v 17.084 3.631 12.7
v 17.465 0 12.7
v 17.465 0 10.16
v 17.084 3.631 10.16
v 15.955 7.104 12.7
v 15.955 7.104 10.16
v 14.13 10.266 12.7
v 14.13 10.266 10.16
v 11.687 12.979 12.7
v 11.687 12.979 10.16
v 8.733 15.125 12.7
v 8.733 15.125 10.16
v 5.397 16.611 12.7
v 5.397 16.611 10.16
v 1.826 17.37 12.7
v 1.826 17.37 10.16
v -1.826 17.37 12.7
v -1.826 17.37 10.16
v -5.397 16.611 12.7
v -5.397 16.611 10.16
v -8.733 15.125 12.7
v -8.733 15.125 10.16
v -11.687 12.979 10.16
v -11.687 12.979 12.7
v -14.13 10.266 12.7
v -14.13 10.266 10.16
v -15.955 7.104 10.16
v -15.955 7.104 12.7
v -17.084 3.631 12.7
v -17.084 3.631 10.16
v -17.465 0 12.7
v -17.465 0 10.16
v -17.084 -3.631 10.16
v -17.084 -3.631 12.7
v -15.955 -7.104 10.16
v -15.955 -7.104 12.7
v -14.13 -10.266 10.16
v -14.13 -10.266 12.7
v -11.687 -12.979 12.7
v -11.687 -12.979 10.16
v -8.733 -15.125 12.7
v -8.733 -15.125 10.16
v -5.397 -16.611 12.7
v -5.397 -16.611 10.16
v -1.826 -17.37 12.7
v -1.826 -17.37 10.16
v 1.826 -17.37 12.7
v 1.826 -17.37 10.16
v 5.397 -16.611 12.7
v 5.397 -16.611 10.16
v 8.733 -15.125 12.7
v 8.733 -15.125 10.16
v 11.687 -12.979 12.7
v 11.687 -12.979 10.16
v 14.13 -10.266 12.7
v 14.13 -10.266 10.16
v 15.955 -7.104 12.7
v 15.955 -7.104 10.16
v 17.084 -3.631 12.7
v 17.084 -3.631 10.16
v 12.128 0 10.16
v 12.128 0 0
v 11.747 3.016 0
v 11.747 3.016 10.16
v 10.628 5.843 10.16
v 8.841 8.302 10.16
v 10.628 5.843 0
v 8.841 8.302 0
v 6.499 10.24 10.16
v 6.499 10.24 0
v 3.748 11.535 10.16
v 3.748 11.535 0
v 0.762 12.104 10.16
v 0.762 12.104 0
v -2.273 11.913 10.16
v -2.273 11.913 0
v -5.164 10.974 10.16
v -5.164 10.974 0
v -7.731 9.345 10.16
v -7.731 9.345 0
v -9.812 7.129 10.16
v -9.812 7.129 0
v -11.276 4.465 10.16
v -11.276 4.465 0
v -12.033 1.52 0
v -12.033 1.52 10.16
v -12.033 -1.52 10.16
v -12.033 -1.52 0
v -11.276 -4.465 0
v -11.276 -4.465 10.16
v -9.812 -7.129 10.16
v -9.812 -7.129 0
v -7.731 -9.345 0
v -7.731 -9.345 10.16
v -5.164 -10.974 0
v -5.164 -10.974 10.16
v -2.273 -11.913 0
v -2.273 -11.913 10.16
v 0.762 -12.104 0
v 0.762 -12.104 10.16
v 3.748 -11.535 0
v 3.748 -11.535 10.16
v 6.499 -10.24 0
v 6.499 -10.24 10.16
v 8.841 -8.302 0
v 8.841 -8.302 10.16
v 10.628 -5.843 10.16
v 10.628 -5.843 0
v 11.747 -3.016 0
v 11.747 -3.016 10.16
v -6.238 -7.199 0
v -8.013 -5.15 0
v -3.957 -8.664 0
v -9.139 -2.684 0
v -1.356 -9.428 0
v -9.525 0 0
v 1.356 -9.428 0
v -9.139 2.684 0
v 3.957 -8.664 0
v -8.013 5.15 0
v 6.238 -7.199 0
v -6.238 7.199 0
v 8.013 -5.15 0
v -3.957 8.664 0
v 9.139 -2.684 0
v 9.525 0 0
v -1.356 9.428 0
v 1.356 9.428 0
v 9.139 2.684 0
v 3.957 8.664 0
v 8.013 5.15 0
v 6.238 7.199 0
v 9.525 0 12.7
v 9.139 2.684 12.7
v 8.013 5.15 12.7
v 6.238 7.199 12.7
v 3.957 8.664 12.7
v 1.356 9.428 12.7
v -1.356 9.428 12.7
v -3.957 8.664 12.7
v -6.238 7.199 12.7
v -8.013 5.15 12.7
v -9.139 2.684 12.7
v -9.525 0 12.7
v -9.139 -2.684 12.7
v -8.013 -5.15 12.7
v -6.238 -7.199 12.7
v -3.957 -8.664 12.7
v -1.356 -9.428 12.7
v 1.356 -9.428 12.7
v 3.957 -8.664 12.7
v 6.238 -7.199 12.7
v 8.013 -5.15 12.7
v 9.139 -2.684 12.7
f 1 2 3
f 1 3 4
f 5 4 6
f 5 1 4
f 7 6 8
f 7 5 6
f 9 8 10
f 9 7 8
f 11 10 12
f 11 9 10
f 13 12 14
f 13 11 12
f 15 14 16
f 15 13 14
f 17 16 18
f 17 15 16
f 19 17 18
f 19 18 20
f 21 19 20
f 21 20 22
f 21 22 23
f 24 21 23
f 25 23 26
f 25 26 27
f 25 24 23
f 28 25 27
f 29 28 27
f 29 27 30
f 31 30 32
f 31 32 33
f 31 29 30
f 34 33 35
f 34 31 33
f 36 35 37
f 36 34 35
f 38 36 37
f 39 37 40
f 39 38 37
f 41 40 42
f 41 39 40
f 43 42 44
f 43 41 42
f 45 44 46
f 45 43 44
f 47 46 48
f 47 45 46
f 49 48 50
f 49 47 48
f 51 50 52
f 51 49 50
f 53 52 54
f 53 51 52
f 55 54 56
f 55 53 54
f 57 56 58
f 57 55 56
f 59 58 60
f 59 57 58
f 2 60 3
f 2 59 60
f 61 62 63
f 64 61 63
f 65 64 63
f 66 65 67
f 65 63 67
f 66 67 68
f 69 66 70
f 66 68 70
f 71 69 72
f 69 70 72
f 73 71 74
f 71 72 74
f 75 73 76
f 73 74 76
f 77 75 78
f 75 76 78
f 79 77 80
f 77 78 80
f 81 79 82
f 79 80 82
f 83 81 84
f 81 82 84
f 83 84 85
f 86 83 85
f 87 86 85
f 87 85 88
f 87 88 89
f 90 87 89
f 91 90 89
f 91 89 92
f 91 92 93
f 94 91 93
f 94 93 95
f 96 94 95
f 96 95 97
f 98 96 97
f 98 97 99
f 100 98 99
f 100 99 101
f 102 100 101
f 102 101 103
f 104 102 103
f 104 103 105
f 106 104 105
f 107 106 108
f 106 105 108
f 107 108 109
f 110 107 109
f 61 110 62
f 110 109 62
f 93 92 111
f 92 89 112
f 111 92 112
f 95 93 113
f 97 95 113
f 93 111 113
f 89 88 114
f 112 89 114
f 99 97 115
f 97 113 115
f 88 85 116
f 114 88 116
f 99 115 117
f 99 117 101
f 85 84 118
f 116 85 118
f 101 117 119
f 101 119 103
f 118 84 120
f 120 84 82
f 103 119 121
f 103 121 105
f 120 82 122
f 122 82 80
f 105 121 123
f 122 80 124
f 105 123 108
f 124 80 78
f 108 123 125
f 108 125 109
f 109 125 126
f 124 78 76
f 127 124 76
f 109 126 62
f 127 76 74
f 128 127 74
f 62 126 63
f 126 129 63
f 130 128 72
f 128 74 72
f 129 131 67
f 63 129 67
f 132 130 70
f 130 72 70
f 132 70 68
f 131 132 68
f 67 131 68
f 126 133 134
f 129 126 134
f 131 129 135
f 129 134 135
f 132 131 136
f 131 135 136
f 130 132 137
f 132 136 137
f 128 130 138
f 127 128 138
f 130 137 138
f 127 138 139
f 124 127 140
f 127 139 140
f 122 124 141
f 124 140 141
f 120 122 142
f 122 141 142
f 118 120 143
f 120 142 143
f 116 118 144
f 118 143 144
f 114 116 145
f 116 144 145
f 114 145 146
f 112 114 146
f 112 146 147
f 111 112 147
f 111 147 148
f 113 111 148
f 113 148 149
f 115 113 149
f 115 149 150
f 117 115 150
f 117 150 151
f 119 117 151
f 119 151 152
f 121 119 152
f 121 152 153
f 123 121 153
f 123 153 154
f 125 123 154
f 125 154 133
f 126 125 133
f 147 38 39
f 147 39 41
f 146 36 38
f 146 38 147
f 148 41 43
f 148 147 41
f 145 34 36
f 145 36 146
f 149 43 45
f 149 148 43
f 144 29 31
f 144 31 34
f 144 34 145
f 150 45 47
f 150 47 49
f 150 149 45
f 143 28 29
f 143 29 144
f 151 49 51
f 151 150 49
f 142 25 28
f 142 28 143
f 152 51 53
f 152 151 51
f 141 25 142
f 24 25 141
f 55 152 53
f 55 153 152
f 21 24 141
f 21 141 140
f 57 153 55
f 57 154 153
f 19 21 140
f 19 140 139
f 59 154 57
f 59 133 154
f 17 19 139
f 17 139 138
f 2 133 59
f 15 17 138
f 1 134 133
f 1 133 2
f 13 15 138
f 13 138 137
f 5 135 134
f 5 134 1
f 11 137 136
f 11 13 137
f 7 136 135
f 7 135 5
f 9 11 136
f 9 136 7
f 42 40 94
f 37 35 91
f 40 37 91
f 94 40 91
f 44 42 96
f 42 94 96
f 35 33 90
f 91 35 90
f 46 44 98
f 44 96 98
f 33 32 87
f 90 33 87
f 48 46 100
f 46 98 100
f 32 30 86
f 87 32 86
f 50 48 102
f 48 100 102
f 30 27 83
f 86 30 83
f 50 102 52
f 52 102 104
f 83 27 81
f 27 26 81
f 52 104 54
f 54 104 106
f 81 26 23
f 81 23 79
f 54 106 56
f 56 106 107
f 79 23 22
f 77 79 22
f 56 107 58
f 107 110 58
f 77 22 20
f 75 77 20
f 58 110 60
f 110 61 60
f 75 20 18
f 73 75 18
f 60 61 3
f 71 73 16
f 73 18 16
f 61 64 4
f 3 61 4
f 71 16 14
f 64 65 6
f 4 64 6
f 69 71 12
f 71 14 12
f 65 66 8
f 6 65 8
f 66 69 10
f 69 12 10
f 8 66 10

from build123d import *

# Parameters (mm, degrees)
F0_R     = 12.128182
F1_DEPTH = 12.7
F2_R     = 9.525
F3_DEPTH = 12.701
F2_R_2   = 17.465404
F2_R_3   = 12.128182
F4_DEPTH = 2.54


with BuildPart() as f1:
    # F0 (on Top) → F1 (new body)
    with BuildSketch(Plane.XY):
        Circle(F0_R)
    extrude(amount=F1_DEPTH)

    # F2 (on face) → F3 (cut, through all)
    with BuildSketch(Plane.XY.offset(12.7)):
        Circle(F2_R)
    extrude(amount=-F3_DEPTH, mode=Mode.SUBTRACT)

    # F2 (on face) → F4 (join)
    with BuildSketch(Plane.XY.offset(12.7)):
        Circle(F2_R_2)
        Circle(F2_R_3, mode=Mode.SUBTRACT)
    extrude(amount=-F4_DEPTH)


solid = f1.part
